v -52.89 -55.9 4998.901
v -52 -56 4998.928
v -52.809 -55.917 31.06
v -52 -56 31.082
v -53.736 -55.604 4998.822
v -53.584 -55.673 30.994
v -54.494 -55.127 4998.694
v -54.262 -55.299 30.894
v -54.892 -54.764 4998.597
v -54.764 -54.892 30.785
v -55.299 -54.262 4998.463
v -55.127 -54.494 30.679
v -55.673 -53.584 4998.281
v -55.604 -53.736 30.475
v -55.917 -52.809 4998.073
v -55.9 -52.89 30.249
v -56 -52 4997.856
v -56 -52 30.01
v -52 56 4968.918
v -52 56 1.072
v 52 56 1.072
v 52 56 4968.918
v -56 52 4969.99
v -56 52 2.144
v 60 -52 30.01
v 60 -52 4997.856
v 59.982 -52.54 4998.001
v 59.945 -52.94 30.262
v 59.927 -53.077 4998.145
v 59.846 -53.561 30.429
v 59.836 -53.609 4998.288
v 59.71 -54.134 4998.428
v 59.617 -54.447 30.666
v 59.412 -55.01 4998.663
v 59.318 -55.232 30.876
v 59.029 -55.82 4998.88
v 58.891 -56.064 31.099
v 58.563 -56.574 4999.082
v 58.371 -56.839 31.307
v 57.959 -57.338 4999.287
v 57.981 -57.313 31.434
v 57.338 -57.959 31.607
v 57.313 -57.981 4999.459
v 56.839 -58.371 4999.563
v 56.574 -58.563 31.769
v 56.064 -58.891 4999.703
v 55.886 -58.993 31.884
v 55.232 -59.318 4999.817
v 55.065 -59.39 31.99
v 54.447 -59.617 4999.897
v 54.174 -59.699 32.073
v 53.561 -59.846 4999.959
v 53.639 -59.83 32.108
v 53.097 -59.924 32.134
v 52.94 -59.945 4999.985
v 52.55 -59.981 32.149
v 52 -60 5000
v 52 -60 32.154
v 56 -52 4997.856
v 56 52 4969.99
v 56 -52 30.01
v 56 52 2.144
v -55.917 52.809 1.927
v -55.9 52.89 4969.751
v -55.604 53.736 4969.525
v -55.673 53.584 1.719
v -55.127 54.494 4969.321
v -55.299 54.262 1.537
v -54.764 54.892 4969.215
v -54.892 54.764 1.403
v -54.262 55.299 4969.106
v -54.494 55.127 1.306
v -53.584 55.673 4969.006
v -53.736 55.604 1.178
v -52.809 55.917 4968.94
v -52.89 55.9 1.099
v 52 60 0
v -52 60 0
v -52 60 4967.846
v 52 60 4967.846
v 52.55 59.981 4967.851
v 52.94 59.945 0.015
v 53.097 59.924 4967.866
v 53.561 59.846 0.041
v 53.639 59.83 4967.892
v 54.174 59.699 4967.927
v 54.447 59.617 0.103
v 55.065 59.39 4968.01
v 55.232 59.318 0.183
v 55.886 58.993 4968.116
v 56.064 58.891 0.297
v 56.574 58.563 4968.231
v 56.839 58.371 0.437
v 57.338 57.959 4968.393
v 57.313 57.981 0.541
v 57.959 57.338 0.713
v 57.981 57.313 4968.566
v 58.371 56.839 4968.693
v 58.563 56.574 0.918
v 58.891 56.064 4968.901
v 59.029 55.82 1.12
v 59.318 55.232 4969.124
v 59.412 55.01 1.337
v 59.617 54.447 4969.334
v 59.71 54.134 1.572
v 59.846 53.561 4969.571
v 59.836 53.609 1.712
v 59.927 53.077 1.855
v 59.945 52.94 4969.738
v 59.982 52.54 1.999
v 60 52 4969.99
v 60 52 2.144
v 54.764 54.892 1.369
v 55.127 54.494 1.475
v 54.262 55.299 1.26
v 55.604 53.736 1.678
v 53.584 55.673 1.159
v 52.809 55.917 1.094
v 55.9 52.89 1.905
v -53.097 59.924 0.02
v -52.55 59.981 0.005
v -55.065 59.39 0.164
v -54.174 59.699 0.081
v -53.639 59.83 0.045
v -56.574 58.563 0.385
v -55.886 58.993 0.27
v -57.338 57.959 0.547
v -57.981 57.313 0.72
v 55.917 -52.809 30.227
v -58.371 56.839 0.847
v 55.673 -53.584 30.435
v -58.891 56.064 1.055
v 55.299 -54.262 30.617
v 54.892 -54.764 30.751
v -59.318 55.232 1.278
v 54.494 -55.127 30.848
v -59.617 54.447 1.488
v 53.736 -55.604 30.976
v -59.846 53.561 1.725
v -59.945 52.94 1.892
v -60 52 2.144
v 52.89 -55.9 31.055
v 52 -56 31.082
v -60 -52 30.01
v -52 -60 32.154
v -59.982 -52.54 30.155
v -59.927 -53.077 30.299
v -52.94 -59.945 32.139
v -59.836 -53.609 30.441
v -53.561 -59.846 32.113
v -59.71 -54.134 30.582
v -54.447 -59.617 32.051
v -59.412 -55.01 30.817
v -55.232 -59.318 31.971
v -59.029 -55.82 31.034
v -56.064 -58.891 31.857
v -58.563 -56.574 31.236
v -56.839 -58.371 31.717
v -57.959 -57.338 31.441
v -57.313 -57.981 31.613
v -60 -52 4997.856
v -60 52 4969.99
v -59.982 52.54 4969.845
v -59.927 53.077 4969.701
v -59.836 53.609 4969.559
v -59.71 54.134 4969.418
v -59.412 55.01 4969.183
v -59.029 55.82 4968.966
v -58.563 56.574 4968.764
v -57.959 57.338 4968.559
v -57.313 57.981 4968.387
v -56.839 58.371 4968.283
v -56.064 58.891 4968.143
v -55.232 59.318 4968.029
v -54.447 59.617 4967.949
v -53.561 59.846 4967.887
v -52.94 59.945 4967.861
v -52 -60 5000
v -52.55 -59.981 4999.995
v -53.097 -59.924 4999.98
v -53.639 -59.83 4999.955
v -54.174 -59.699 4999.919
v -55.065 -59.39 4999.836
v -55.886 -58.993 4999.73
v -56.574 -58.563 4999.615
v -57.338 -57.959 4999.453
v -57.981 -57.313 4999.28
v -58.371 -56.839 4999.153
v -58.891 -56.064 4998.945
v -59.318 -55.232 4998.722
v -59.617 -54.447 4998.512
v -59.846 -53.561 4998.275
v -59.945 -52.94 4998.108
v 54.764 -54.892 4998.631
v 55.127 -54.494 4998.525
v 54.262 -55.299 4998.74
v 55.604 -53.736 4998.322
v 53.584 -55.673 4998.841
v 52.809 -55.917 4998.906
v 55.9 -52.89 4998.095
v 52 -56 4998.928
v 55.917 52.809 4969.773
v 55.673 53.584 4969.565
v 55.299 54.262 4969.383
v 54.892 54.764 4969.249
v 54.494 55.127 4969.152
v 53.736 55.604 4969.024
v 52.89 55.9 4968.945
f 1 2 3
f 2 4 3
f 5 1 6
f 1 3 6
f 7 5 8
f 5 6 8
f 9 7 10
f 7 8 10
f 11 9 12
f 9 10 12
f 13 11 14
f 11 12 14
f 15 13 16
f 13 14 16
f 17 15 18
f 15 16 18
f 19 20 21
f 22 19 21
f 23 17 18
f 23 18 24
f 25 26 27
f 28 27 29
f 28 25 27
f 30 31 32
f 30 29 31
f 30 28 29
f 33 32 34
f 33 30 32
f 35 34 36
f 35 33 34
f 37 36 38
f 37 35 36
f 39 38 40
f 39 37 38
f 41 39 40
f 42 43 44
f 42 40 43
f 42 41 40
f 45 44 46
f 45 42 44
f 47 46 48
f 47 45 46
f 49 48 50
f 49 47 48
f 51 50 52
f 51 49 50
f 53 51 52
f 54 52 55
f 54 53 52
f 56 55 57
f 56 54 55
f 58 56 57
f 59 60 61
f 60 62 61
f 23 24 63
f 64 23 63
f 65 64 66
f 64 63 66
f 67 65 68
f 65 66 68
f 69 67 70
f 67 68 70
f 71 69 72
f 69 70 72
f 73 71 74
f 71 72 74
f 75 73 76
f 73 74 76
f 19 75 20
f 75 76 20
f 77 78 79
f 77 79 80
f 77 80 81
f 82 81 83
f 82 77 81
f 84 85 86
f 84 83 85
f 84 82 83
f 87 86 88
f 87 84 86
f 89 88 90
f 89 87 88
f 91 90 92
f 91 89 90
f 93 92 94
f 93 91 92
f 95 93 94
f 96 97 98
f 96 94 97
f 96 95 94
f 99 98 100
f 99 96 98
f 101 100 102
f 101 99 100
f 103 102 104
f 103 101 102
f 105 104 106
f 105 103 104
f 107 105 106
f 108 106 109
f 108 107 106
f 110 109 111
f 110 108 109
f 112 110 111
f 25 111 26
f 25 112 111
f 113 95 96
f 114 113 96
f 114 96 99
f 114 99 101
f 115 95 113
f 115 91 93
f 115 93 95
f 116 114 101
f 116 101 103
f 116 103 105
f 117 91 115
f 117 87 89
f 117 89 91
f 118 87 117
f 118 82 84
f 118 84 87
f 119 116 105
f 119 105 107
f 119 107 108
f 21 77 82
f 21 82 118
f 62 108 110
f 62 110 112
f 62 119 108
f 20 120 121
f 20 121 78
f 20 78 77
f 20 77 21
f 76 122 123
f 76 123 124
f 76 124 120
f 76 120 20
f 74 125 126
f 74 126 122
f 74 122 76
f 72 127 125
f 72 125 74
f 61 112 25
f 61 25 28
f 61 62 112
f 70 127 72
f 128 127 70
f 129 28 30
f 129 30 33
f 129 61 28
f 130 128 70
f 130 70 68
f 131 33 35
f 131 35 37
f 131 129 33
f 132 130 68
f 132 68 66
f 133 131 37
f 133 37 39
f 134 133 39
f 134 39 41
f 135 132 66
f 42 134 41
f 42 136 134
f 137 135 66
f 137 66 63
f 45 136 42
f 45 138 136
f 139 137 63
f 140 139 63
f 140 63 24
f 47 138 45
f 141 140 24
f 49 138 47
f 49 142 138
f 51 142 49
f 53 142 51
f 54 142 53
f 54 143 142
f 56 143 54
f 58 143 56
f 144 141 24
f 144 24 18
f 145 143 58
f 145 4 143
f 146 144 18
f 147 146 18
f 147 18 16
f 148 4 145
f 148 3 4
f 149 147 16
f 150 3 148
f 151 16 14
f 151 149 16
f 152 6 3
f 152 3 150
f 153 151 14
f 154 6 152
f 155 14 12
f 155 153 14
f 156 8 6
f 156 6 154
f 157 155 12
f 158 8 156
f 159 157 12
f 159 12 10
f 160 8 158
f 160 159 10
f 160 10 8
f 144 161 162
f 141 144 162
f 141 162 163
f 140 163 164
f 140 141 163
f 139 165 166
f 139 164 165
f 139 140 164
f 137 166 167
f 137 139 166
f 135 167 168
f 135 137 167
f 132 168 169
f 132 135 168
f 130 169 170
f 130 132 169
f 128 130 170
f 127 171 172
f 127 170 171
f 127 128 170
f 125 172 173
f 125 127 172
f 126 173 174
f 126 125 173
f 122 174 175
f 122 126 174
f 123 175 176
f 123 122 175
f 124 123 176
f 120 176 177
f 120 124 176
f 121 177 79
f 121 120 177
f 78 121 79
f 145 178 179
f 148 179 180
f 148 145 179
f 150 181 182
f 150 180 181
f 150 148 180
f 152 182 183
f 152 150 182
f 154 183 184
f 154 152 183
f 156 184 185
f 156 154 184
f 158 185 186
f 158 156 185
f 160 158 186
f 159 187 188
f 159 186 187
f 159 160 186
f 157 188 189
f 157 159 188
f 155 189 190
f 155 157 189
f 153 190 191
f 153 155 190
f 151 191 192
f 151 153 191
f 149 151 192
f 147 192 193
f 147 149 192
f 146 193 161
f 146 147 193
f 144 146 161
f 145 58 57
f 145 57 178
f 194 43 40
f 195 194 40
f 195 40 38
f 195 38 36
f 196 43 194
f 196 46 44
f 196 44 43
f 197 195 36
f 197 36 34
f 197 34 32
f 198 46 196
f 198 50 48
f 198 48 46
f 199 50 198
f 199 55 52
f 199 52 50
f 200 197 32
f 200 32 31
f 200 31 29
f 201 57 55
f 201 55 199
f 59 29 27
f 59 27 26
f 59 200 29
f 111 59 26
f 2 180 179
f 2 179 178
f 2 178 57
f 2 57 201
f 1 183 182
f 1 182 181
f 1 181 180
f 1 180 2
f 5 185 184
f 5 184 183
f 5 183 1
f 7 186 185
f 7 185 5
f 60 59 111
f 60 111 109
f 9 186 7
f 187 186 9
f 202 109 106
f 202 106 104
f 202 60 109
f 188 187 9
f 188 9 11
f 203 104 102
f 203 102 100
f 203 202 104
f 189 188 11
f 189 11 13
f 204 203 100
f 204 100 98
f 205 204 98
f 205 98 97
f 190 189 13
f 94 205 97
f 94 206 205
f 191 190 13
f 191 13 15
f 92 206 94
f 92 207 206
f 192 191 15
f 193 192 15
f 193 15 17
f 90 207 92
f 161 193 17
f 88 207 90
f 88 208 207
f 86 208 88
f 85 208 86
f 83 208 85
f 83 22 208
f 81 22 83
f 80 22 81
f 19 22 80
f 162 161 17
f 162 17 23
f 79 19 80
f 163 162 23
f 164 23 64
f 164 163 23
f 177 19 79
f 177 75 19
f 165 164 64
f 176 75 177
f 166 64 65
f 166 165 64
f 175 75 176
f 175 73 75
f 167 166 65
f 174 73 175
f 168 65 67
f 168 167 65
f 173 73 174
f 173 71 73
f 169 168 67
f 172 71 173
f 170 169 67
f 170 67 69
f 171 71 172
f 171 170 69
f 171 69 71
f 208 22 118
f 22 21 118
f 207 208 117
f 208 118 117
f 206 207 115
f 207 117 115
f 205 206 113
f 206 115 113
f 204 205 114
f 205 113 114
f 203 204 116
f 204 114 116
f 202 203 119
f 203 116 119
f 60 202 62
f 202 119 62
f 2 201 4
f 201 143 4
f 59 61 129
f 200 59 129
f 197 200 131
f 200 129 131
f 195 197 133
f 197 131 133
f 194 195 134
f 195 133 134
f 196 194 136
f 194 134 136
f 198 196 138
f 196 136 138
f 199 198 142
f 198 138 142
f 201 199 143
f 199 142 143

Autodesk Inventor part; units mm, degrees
ref_plane "YZ Plane" through (0, 0, 0) normal (1, 0, 0) x (0, 1, 0)
ref_plane "Start plane" through (0, 0, 0) normal (0, 0, 1) x (1, 0, 0)
ref_plane "End plane" through (0, 0, 5000) normal (0, 0, 1) x (1, 0, 0)
sketch "Sketch" plane through (0, 0, 0) normal (0, 0, 1) x (1, 0, 0)
  line L0 (-60, -52) -> (-60, 52)
  line L1 (-52, 60) -> (52, 60)
  line L2 (60, 52) -> (60, -52)
  line L3 (52, -60) -> (-52, -60)
  arc A0 (-60, -52) -> (-52, -60) centre (-52, -52) ccw
  arc A1 (60, 52) -> (52, 60) centre (52, 52) ccw
  arc A2 (-52, 60) -> (-60, 52) centre (-52, 52) ccw
  arc A3 (52, -60) -> (60, -52) centre (52, -52) ccw
  arc A4 (-52, 56) -> (-56, 52) centre (-52, 52) ccw
  line L4 (-52, 56) -> (52, 56)
  arc A5 (56, 52) -> (52, 56) centre (52, 52) ccw
  line L5 (56, 52) -> (56, -52)
  arc A6 (52, -56) -> (56, -52) centre (52, -52) ccw
  line L6 (52, -56) -> (-52, -56)
  arc A7 (-56, -52) -> (-52, -56) centre (-52, -52) ccw
  line L7 (-56, -52) -> (-56, 52)
  line L8 (0, 72.3196) -> (0, -72.3196) construction
  line L9 (-86.3196, 0) -> (86.3196, 0) construction
  dimension "d7" = 8
  dimension "d9" = 120
  dimension "d11" = 120
  dimension "d12" = 4
  dimension "d15" = 60
  dimension "d16" = 60
extrude "Body" add sketch "Sketch" along normal up to surface (5000 mm away) from surface at 0
sketch "Sketch3" plane through (0, 0, 0) normal (0, 0, 1) x (1, 0, 0)
  line L0 (0, 0) -> (10, 0)
ref_plane "Work Plane3" through (0, 0, 0) normal (0, -1, 0) x (1, 0, 0)
sketch "Sketch5" plane through (0, 0, 0) normal (1, 0, 0) x (0, 1, 0)
  line L0 (60, 0) -> (60, 5000) projected
  line L1 (60, 0) -> (60, 5000) projected
  line L2 (-60, 0) -> (-60, 5000) projected
  line L3 (-60, 0) -> (-60, 5000) projected
  line L4 (60, 0) -> (-60, 32.1539)
  line L5 (52, 0) -> (60, 0) projected
  line L6 (60, 0) -> (-60, 0)
  line L7 (-60, 0) -> (-60, 5000) projected
  line L8 (60, 0) -> (60, 5000) projected
  line L9 (-60, 5000) -> (60, 5000)
  line L10 (-60, 5000) -> (60, 4967.8461)
  point P0 (0, 0)
  point P1 (60, 5000)
  point P2 (60, 4967.8461)
  point P3 (-60, 0)
  point P4 (-60, 32.1539)
  dimension "d19" = 15
extrude "Extrusion2" cut sketch "Sketch5" along normal through all both and the other way through all contours L5 L6 L2 L4 | L10 L9 L0
sketch "Sketch4" plane through (0, 0, 0) normal (0, -1, 0) x (1, 0, 0)
  line L0 (-2, 0) -> (12, 0) projected
  line L1 (-2, 5000) -> (12, 5000) projected
  dimension "d18" = 5000
equation "\"d7\" = G_IR"
equation "\"d9\" = G_W"
equation "\"d11\" = G_H"
equation "\"d12\" = G_T"
equation "\"d15\" = 0.5 * d9"
equation "\"d16\" = 0.5 * d11"
equation "\"d3\" = G_L"
equation "\"G_W\" = 120"
equation "\"G_H\" = 120"
equation "\"G_T\" = 4"
equation "\"G_IR\" = 8"
equation "\"G_L\" = d18"
equation "\"G_OFFSET_START\" = 0"
equation "\"G_OFFSET_END\" = 0"
properties part number "Stand" material "Steel, Mild"
